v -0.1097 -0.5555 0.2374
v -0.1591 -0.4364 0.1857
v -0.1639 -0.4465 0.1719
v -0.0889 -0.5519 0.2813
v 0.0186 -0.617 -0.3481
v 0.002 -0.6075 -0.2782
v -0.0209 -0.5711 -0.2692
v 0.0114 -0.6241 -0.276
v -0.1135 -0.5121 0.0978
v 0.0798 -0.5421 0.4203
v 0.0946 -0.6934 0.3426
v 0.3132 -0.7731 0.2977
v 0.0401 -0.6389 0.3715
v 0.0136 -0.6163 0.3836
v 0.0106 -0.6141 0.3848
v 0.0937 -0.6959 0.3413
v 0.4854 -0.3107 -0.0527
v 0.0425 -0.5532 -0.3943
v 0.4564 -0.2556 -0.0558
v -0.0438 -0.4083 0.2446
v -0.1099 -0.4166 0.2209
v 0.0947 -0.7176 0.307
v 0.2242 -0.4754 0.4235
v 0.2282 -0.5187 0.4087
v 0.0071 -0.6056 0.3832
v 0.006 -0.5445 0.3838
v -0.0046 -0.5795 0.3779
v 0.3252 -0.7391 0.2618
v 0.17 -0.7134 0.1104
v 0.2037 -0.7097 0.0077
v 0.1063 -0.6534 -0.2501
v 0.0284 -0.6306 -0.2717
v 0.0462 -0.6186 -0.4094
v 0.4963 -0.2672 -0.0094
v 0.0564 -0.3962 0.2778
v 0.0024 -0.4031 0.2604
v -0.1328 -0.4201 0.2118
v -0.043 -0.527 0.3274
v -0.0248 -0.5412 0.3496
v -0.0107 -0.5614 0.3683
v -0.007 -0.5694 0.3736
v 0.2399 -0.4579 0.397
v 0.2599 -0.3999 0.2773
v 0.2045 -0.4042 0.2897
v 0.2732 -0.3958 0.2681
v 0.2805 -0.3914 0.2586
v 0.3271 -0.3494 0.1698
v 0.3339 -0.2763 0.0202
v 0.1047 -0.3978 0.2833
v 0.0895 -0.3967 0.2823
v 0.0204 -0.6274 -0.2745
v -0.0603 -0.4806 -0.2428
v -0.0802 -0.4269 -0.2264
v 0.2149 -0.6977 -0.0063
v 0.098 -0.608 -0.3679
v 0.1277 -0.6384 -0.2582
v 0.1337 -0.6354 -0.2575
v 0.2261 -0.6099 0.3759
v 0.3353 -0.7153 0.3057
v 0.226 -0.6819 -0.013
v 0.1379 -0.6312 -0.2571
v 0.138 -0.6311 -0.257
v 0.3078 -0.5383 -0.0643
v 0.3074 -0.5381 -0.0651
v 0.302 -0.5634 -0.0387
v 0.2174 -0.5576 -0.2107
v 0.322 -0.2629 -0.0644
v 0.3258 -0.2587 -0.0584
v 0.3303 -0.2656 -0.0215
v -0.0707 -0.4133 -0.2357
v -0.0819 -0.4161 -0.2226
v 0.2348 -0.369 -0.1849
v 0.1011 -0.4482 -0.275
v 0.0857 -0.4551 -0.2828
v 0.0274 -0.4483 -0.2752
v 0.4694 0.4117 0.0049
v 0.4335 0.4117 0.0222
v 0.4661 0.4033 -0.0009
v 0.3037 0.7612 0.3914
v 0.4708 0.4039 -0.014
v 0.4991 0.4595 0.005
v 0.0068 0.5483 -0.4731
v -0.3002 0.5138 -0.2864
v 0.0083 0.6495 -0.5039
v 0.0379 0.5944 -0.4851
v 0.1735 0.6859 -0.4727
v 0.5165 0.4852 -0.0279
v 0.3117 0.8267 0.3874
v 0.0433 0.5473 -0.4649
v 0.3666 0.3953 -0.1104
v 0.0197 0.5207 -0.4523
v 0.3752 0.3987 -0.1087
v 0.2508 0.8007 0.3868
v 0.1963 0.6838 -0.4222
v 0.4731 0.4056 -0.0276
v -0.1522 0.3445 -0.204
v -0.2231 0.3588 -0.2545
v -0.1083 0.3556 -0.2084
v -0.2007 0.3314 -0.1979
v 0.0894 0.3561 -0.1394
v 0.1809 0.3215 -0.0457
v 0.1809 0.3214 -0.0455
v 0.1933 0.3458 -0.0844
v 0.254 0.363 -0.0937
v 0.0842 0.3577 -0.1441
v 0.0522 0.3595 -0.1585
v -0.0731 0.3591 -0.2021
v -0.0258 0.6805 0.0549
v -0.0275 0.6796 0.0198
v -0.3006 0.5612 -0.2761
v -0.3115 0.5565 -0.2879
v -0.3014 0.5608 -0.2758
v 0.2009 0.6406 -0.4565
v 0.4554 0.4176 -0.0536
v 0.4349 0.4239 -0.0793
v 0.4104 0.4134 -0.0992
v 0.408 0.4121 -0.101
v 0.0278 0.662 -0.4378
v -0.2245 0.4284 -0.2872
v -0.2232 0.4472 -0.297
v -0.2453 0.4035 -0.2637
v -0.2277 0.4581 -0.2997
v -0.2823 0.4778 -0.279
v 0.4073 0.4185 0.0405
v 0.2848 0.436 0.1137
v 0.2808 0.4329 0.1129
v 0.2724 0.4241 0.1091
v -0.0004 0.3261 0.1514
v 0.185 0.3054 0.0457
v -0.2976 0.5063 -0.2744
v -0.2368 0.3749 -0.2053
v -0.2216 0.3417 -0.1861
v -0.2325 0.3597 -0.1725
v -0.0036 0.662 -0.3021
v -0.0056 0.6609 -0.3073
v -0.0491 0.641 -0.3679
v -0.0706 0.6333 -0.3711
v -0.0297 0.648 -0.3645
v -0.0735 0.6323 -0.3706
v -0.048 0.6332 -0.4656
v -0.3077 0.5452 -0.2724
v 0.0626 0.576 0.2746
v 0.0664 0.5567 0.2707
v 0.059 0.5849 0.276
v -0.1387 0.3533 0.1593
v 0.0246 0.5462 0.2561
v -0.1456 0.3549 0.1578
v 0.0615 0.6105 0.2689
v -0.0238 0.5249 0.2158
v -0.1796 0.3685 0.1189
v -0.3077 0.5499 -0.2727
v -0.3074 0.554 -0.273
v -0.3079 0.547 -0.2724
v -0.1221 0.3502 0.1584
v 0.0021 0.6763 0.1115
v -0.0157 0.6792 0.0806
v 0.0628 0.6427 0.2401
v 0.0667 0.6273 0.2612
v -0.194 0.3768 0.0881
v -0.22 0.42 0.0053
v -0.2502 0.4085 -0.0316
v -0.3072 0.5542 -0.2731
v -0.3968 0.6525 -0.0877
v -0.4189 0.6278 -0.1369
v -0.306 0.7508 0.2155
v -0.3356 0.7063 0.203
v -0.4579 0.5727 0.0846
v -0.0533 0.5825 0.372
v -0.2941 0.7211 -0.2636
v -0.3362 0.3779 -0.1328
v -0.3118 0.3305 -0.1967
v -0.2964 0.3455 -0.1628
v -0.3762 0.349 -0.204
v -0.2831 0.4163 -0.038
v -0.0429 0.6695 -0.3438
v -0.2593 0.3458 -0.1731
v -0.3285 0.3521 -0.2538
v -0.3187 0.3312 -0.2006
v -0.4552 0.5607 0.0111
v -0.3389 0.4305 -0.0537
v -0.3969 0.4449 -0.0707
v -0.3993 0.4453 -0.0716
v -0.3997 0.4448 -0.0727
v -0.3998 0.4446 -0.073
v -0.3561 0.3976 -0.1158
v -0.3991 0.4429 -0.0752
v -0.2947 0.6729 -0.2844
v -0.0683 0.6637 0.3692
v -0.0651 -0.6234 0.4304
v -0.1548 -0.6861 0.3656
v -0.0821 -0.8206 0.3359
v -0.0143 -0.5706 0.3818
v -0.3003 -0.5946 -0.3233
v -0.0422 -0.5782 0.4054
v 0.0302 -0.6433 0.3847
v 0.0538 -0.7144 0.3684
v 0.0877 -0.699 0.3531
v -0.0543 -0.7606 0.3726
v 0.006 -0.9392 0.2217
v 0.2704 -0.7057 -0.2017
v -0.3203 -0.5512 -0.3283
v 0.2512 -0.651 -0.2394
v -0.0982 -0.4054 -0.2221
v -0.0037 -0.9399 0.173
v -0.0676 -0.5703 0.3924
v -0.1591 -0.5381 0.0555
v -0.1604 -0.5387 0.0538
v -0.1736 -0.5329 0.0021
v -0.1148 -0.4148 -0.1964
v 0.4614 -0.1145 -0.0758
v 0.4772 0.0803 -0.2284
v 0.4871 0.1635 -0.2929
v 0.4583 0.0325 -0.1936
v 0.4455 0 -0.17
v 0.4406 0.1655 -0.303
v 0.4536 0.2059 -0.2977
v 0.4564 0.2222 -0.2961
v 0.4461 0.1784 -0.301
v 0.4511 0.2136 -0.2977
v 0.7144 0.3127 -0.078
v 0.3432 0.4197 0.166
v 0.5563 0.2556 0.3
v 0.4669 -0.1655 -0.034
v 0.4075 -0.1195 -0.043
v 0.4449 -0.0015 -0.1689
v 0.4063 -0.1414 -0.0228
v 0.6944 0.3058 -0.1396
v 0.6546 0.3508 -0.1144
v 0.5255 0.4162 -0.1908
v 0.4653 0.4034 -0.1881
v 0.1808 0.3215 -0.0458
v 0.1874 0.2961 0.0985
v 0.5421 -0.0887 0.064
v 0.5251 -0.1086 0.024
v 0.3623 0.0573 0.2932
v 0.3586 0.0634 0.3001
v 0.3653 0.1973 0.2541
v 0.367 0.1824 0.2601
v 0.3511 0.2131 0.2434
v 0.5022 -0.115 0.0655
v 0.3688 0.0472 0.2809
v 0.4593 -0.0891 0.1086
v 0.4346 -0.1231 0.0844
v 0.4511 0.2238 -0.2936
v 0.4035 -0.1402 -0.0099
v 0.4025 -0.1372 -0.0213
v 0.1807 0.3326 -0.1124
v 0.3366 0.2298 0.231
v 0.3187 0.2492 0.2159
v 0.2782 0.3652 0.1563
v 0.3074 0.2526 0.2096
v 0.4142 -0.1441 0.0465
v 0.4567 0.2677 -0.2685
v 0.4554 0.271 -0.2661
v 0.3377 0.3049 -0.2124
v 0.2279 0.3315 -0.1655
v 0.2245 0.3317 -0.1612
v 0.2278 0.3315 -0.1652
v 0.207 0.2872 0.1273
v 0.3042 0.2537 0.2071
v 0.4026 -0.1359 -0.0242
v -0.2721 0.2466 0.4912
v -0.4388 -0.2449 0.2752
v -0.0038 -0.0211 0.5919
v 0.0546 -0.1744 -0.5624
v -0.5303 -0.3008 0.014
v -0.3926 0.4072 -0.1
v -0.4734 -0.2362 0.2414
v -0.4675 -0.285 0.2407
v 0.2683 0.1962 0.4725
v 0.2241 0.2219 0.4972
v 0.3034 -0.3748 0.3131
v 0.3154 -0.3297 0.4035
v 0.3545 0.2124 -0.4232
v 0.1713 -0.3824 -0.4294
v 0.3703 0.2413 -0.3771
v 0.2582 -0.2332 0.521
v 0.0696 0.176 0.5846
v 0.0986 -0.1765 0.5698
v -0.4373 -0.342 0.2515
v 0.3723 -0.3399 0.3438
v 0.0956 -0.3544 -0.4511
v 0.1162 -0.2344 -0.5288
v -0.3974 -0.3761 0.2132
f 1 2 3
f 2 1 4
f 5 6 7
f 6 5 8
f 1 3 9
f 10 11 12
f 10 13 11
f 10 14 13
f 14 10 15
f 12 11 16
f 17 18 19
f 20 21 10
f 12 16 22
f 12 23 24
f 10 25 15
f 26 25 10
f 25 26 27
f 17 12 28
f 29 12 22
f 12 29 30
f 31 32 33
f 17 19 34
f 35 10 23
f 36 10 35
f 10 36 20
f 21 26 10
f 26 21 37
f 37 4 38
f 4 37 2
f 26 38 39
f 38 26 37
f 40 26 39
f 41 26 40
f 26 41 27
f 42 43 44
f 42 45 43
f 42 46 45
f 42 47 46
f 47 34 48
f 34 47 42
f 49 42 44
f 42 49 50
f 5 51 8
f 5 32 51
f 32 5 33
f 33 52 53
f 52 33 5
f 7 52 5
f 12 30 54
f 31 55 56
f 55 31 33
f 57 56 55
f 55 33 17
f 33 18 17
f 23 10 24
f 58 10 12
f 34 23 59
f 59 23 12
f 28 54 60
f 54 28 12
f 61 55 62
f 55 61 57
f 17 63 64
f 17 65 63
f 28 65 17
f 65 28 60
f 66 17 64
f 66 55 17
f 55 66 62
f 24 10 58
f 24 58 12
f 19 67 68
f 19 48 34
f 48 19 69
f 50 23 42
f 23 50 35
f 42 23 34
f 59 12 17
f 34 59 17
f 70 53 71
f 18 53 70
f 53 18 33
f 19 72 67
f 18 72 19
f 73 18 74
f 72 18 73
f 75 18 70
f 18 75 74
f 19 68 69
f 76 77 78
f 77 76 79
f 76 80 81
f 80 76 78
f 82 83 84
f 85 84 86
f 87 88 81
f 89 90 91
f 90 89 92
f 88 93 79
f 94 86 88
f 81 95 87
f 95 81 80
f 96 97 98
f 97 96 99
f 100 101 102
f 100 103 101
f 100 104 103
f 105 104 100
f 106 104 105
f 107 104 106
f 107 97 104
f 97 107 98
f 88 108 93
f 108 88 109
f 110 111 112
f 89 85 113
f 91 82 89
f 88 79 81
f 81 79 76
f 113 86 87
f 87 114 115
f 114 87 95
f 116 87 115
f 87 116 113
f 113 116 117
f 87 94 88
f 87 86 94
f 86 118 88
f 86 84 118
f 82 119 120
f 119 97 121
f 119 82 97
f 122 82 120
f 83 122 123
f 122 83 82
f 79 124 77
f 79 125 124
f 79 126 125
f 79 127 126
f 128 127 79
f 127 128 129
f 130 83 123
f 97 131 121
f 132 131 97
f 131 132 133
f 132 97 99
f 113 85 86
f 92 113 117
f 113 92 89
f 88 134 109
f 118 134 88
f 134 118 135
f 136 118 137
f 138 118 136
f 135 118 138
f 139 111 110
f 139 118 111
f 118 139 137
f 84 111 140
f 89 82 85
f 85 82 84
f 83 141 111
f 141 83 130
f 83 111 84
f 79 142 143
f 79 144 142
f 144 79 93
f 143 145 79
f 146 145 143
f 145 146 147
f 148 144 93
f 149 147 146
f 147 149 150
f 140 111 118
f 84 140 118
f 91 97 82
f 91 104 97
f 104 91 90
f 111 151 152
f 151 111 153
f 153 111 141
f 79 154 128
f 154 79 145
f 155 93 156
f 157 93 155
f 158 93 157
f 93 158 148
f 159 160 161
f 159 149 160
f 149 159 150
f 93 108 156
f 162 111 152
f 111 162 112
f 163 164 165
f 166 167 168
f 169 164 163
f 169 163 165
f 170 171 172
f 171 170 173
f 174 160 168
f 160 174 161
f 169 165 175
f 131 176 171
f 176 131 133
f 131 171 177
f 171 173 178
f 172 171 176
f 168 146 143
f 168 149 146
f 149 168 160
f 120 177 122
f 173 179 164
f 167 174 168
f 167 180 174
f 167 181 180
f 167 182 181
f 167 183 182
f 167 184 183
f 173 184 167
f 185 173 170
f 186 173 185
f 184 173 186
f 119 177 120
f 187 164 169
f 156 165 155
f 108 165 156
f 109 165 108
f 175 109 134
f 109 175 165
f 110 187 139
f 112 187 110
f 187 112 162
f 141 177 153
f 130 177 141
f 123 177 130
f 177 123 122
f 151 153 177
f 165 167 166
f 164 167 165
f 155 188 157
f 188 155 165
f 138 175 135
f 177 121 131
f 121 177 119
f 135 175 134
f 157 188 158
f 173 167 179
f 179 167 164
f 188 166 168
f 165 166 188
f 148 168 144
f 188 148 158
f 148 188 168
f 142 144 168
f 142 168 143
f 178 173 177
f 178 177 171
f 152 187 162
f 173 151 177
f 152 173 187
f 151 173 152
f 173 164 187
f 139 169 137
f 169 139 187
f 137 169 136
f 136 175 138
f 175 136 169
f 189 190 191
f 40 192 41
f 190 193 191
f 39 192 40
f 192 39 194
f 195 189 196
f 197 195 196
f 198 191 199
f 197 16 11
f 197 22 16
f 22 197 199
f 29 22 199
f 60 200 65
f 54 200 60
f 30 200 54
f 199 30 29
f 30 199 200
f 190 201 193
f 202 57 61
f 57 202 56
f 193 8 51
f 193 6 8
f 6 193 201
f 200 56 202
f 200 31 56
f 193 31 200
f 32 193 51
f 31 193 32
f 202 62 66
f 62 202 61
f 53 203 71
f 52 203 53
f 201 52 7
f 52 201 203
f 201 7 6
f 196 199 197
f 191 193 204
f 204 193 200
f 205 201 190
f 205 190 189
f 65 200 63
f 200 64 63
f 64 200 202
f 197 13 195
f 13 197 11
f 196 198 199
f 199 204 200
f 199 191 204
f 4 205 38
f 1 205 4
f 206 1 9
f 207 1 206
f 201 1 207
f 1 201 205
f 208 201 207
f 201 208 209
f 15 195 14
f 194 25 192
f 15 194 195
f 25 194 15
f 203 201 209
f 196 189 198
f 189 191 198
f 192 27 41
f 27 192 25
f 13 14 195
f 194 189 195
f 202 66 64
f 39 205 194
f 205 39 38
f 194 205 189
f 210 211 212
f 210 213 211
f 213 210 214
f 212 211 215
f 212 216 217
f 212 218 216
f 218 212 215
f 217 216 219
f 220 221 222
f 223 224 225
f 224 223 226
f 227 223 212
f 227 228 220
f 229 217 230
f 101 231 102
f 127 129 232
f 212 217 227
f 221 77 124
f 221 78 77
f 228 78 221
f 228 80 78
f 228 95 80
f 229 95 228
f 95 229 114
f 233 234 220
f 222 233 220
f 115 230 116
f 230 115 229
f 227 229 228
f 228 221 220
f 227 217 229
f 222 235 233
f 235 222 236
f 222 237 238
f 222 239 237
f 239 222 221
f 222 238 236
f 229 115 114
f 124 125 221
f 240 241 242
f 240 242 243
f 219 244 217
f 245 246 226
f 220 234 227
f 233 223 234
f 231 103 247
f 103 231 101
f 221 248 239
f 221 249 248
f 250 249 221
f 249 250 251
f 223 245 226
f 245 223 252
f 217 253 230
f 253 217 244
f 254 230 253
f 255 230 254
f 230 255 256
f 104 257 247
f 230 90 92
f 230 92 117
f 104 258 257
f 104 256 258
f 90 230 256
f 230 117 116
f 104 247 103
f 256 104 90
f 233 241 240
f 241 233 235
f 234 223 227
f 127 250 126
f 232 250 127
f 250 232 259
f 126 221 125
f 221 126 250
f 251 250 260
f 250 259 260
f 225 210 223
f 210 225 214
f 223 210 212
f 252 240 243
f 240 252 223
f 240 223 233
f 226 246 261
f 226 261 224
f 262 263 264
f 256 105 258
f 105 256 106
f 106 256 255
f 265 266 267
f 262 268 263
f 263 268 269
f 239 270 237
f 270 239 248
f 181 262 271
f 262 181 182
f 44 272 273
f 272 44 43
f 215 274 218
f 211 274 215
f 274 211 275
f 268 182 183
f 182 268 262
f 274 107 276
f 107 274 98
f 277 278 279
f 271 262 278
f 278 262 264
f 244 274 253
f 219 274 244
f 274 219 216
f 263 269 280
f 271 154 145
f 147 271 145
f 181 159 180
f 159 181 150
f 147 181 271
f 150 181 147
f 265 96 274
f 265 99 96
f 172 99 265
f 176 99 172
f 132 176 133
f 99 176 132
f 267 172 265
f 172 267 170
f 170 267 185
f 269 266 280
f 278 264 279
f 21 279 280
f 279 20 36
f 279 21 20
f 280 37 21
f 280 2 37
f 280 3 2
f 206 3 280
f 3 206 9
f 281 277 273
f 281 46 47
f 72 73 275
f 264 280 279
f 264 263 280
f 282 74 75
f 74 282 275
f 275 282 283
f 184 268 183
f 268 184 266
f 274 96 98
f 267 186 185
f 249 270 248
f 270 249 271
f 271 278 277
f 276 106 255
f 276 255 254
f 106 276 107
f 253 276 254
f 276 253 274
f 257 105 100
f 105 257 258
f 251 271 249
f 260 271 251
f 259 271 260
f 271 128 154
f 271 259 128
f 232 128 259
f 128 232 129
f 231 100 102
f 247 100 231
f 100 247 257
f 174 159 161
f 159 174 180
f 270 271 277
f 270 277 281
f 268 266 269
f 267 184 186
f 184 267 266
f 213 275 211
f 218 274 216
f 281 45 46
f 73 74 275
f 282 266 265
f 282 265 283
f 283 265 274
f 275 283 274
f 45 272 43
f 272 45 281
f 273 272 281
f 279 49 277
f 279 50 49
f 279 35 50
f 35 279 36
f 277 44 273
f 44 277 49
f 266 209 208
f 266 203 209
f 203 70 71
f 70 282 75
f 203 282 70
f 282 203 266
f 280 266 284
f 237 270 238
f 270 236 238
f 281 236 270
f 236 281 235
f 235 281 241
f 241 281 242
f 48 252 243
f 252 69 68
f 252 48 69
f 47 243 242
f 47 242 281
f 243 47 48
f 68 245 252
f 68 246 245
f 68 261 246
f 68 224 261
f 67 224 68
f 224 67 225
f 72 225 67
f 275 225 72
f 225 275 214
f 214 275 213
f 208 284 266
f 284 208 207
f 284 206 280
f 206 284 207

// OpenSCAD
// file: lib.scad
function x(v) = v[0];
function y(v) = v[1];
function z(v) = v[2];
function add(v1,v2) = [ for (i = [ 0 : len(v1)-1 ]) v1[i] + v2[i] ];
function xv(d) = [d,0,0];
function yv(d) = [0,d,0];
function zv(d) = [0,0,d];

module box(v) { cube(size=v, center=true); }
module cyl(r1,r2,h) { cylinder(r1=r1, r2=r2, h=h, center=true); }

function grow(n,v) = [x(v)+n*2, y(v)+n*2, z(v)+n*2];

module rbox(v, radius=1) {
	cx = x(v)/2-radius;
	cy = y(v)/2-radius;
	cz = z(v)/2-radius;

	hull() {
		translate([cx,cy,cz]) sphere(r=radius);
		translate([cx,cy,-cz]) sphere(r=radius);
		translate([cx,-cy,cz]) sphere(r=radius);
		translate([cx,-cy,-cz]) sphere(r=radius);
		translate([-cx,cy,cz]) sphere(r=radius);
		translate([-cx,cy,-cz]) sphere(r=radius);
		translate([-cx,-cy,cz]) sphere(r=radius);
		translate([-cx,-cy,-cz]) sphere(r=radius);
	}
}

module fillet(r=1) {
  minkowski() {
    difference() {
      children();
      minkowski() {
        difference() {
          minkowski() {
            children();
            sphere(r=r);
          }
          children();
        }
        sphere(r=r);
      }
    }
    sphere(r=r);
  }
}
// main file
use <lib.scad>;

// Module randomRock : draws a random rock
module randomRock(radius,corner_size,number_of_corners){
  // Draw rock
  hull(){
    // Make a hull..
    for(i=[0:number_of_corners]){
      // random position in 'sphere'
      y = rands(0,360,1)[0];
      z = rands(0,360,1)[0];
      r = rands(corner_size*0.5,corner_size,1)[0];

      rotate([0,y,z])

      // translate radius (minus half of corner size)
      translate([radius-corner_size*0.5,0,0])

      // draw cube as corner
      rotate([rands(0,360,1)[0],rands(0,360,1)[0],rands(0,360,1)[0]]) // random rotation
      //cube(rands(corner_size*0.5,corner_size,1)[0],center = true);
      cylinder(r1=r, r2=0, h=r, $fn=3);
    }
  }
}

// : More corners --> More 'spheric' central stone
number_of_corners = rands(15,20,1)[0]; // [5:30]

// : Deforms central stone in vertical
stone_scale = 0.6; // [0.2:0.1:3]

// Number of medium size stones
medium_stones = 5; //rands(5,10,1)[0]; // [5:30]

// Number of small stones
small_stones = 0; //rands(8,16,1)[0]; // [5:30]

/* [Hidden] */
radius = 20;
corner_size = 2;

// Example
translate([0,0,0.5]) scale([0.05,0.05,0.05])
	translate([0,0,-10]) intersection(){
	  union(){

	    // big central stone
	    scale([0.6,0.6,stone_scale])

	    randomRock(radius,corner_size,number_of_corners);

	    // medium size stones
	    if(medium_stones>0){
	      for(i=[1:medium_stones]){
	        // random position in 'circle'
	        z = rands(0,360,1)[0];
	        rotate([0,0,z])

	        // translate radius
	        translate([rands(radius*0.4,radius*0.7,1)[0],0,0])
	        	randomRock(rands(radius*0.3,radius*0.5,1)[0],corner_size*0.5,10);
	      }
	    }

	    // small stones
	    if(small_stones>0){
	      for(i=[0:small_stones]){
	        // random position in 'circle'
	        z = rands(0,360,1)[0];
	        rotate([0,0,z])

	        // translate radius
	        translate([rands(radius*0.5,radius*0.9,1)[0],0,0])
	        	randomRock(rands(radius*0.1,radius*0.3,1)[0],corner_size*0.5,10);
	      }
	    }

	  }
	  // cut half of figure
	  //translate([-50,-50,0]) cube(100);
	}
